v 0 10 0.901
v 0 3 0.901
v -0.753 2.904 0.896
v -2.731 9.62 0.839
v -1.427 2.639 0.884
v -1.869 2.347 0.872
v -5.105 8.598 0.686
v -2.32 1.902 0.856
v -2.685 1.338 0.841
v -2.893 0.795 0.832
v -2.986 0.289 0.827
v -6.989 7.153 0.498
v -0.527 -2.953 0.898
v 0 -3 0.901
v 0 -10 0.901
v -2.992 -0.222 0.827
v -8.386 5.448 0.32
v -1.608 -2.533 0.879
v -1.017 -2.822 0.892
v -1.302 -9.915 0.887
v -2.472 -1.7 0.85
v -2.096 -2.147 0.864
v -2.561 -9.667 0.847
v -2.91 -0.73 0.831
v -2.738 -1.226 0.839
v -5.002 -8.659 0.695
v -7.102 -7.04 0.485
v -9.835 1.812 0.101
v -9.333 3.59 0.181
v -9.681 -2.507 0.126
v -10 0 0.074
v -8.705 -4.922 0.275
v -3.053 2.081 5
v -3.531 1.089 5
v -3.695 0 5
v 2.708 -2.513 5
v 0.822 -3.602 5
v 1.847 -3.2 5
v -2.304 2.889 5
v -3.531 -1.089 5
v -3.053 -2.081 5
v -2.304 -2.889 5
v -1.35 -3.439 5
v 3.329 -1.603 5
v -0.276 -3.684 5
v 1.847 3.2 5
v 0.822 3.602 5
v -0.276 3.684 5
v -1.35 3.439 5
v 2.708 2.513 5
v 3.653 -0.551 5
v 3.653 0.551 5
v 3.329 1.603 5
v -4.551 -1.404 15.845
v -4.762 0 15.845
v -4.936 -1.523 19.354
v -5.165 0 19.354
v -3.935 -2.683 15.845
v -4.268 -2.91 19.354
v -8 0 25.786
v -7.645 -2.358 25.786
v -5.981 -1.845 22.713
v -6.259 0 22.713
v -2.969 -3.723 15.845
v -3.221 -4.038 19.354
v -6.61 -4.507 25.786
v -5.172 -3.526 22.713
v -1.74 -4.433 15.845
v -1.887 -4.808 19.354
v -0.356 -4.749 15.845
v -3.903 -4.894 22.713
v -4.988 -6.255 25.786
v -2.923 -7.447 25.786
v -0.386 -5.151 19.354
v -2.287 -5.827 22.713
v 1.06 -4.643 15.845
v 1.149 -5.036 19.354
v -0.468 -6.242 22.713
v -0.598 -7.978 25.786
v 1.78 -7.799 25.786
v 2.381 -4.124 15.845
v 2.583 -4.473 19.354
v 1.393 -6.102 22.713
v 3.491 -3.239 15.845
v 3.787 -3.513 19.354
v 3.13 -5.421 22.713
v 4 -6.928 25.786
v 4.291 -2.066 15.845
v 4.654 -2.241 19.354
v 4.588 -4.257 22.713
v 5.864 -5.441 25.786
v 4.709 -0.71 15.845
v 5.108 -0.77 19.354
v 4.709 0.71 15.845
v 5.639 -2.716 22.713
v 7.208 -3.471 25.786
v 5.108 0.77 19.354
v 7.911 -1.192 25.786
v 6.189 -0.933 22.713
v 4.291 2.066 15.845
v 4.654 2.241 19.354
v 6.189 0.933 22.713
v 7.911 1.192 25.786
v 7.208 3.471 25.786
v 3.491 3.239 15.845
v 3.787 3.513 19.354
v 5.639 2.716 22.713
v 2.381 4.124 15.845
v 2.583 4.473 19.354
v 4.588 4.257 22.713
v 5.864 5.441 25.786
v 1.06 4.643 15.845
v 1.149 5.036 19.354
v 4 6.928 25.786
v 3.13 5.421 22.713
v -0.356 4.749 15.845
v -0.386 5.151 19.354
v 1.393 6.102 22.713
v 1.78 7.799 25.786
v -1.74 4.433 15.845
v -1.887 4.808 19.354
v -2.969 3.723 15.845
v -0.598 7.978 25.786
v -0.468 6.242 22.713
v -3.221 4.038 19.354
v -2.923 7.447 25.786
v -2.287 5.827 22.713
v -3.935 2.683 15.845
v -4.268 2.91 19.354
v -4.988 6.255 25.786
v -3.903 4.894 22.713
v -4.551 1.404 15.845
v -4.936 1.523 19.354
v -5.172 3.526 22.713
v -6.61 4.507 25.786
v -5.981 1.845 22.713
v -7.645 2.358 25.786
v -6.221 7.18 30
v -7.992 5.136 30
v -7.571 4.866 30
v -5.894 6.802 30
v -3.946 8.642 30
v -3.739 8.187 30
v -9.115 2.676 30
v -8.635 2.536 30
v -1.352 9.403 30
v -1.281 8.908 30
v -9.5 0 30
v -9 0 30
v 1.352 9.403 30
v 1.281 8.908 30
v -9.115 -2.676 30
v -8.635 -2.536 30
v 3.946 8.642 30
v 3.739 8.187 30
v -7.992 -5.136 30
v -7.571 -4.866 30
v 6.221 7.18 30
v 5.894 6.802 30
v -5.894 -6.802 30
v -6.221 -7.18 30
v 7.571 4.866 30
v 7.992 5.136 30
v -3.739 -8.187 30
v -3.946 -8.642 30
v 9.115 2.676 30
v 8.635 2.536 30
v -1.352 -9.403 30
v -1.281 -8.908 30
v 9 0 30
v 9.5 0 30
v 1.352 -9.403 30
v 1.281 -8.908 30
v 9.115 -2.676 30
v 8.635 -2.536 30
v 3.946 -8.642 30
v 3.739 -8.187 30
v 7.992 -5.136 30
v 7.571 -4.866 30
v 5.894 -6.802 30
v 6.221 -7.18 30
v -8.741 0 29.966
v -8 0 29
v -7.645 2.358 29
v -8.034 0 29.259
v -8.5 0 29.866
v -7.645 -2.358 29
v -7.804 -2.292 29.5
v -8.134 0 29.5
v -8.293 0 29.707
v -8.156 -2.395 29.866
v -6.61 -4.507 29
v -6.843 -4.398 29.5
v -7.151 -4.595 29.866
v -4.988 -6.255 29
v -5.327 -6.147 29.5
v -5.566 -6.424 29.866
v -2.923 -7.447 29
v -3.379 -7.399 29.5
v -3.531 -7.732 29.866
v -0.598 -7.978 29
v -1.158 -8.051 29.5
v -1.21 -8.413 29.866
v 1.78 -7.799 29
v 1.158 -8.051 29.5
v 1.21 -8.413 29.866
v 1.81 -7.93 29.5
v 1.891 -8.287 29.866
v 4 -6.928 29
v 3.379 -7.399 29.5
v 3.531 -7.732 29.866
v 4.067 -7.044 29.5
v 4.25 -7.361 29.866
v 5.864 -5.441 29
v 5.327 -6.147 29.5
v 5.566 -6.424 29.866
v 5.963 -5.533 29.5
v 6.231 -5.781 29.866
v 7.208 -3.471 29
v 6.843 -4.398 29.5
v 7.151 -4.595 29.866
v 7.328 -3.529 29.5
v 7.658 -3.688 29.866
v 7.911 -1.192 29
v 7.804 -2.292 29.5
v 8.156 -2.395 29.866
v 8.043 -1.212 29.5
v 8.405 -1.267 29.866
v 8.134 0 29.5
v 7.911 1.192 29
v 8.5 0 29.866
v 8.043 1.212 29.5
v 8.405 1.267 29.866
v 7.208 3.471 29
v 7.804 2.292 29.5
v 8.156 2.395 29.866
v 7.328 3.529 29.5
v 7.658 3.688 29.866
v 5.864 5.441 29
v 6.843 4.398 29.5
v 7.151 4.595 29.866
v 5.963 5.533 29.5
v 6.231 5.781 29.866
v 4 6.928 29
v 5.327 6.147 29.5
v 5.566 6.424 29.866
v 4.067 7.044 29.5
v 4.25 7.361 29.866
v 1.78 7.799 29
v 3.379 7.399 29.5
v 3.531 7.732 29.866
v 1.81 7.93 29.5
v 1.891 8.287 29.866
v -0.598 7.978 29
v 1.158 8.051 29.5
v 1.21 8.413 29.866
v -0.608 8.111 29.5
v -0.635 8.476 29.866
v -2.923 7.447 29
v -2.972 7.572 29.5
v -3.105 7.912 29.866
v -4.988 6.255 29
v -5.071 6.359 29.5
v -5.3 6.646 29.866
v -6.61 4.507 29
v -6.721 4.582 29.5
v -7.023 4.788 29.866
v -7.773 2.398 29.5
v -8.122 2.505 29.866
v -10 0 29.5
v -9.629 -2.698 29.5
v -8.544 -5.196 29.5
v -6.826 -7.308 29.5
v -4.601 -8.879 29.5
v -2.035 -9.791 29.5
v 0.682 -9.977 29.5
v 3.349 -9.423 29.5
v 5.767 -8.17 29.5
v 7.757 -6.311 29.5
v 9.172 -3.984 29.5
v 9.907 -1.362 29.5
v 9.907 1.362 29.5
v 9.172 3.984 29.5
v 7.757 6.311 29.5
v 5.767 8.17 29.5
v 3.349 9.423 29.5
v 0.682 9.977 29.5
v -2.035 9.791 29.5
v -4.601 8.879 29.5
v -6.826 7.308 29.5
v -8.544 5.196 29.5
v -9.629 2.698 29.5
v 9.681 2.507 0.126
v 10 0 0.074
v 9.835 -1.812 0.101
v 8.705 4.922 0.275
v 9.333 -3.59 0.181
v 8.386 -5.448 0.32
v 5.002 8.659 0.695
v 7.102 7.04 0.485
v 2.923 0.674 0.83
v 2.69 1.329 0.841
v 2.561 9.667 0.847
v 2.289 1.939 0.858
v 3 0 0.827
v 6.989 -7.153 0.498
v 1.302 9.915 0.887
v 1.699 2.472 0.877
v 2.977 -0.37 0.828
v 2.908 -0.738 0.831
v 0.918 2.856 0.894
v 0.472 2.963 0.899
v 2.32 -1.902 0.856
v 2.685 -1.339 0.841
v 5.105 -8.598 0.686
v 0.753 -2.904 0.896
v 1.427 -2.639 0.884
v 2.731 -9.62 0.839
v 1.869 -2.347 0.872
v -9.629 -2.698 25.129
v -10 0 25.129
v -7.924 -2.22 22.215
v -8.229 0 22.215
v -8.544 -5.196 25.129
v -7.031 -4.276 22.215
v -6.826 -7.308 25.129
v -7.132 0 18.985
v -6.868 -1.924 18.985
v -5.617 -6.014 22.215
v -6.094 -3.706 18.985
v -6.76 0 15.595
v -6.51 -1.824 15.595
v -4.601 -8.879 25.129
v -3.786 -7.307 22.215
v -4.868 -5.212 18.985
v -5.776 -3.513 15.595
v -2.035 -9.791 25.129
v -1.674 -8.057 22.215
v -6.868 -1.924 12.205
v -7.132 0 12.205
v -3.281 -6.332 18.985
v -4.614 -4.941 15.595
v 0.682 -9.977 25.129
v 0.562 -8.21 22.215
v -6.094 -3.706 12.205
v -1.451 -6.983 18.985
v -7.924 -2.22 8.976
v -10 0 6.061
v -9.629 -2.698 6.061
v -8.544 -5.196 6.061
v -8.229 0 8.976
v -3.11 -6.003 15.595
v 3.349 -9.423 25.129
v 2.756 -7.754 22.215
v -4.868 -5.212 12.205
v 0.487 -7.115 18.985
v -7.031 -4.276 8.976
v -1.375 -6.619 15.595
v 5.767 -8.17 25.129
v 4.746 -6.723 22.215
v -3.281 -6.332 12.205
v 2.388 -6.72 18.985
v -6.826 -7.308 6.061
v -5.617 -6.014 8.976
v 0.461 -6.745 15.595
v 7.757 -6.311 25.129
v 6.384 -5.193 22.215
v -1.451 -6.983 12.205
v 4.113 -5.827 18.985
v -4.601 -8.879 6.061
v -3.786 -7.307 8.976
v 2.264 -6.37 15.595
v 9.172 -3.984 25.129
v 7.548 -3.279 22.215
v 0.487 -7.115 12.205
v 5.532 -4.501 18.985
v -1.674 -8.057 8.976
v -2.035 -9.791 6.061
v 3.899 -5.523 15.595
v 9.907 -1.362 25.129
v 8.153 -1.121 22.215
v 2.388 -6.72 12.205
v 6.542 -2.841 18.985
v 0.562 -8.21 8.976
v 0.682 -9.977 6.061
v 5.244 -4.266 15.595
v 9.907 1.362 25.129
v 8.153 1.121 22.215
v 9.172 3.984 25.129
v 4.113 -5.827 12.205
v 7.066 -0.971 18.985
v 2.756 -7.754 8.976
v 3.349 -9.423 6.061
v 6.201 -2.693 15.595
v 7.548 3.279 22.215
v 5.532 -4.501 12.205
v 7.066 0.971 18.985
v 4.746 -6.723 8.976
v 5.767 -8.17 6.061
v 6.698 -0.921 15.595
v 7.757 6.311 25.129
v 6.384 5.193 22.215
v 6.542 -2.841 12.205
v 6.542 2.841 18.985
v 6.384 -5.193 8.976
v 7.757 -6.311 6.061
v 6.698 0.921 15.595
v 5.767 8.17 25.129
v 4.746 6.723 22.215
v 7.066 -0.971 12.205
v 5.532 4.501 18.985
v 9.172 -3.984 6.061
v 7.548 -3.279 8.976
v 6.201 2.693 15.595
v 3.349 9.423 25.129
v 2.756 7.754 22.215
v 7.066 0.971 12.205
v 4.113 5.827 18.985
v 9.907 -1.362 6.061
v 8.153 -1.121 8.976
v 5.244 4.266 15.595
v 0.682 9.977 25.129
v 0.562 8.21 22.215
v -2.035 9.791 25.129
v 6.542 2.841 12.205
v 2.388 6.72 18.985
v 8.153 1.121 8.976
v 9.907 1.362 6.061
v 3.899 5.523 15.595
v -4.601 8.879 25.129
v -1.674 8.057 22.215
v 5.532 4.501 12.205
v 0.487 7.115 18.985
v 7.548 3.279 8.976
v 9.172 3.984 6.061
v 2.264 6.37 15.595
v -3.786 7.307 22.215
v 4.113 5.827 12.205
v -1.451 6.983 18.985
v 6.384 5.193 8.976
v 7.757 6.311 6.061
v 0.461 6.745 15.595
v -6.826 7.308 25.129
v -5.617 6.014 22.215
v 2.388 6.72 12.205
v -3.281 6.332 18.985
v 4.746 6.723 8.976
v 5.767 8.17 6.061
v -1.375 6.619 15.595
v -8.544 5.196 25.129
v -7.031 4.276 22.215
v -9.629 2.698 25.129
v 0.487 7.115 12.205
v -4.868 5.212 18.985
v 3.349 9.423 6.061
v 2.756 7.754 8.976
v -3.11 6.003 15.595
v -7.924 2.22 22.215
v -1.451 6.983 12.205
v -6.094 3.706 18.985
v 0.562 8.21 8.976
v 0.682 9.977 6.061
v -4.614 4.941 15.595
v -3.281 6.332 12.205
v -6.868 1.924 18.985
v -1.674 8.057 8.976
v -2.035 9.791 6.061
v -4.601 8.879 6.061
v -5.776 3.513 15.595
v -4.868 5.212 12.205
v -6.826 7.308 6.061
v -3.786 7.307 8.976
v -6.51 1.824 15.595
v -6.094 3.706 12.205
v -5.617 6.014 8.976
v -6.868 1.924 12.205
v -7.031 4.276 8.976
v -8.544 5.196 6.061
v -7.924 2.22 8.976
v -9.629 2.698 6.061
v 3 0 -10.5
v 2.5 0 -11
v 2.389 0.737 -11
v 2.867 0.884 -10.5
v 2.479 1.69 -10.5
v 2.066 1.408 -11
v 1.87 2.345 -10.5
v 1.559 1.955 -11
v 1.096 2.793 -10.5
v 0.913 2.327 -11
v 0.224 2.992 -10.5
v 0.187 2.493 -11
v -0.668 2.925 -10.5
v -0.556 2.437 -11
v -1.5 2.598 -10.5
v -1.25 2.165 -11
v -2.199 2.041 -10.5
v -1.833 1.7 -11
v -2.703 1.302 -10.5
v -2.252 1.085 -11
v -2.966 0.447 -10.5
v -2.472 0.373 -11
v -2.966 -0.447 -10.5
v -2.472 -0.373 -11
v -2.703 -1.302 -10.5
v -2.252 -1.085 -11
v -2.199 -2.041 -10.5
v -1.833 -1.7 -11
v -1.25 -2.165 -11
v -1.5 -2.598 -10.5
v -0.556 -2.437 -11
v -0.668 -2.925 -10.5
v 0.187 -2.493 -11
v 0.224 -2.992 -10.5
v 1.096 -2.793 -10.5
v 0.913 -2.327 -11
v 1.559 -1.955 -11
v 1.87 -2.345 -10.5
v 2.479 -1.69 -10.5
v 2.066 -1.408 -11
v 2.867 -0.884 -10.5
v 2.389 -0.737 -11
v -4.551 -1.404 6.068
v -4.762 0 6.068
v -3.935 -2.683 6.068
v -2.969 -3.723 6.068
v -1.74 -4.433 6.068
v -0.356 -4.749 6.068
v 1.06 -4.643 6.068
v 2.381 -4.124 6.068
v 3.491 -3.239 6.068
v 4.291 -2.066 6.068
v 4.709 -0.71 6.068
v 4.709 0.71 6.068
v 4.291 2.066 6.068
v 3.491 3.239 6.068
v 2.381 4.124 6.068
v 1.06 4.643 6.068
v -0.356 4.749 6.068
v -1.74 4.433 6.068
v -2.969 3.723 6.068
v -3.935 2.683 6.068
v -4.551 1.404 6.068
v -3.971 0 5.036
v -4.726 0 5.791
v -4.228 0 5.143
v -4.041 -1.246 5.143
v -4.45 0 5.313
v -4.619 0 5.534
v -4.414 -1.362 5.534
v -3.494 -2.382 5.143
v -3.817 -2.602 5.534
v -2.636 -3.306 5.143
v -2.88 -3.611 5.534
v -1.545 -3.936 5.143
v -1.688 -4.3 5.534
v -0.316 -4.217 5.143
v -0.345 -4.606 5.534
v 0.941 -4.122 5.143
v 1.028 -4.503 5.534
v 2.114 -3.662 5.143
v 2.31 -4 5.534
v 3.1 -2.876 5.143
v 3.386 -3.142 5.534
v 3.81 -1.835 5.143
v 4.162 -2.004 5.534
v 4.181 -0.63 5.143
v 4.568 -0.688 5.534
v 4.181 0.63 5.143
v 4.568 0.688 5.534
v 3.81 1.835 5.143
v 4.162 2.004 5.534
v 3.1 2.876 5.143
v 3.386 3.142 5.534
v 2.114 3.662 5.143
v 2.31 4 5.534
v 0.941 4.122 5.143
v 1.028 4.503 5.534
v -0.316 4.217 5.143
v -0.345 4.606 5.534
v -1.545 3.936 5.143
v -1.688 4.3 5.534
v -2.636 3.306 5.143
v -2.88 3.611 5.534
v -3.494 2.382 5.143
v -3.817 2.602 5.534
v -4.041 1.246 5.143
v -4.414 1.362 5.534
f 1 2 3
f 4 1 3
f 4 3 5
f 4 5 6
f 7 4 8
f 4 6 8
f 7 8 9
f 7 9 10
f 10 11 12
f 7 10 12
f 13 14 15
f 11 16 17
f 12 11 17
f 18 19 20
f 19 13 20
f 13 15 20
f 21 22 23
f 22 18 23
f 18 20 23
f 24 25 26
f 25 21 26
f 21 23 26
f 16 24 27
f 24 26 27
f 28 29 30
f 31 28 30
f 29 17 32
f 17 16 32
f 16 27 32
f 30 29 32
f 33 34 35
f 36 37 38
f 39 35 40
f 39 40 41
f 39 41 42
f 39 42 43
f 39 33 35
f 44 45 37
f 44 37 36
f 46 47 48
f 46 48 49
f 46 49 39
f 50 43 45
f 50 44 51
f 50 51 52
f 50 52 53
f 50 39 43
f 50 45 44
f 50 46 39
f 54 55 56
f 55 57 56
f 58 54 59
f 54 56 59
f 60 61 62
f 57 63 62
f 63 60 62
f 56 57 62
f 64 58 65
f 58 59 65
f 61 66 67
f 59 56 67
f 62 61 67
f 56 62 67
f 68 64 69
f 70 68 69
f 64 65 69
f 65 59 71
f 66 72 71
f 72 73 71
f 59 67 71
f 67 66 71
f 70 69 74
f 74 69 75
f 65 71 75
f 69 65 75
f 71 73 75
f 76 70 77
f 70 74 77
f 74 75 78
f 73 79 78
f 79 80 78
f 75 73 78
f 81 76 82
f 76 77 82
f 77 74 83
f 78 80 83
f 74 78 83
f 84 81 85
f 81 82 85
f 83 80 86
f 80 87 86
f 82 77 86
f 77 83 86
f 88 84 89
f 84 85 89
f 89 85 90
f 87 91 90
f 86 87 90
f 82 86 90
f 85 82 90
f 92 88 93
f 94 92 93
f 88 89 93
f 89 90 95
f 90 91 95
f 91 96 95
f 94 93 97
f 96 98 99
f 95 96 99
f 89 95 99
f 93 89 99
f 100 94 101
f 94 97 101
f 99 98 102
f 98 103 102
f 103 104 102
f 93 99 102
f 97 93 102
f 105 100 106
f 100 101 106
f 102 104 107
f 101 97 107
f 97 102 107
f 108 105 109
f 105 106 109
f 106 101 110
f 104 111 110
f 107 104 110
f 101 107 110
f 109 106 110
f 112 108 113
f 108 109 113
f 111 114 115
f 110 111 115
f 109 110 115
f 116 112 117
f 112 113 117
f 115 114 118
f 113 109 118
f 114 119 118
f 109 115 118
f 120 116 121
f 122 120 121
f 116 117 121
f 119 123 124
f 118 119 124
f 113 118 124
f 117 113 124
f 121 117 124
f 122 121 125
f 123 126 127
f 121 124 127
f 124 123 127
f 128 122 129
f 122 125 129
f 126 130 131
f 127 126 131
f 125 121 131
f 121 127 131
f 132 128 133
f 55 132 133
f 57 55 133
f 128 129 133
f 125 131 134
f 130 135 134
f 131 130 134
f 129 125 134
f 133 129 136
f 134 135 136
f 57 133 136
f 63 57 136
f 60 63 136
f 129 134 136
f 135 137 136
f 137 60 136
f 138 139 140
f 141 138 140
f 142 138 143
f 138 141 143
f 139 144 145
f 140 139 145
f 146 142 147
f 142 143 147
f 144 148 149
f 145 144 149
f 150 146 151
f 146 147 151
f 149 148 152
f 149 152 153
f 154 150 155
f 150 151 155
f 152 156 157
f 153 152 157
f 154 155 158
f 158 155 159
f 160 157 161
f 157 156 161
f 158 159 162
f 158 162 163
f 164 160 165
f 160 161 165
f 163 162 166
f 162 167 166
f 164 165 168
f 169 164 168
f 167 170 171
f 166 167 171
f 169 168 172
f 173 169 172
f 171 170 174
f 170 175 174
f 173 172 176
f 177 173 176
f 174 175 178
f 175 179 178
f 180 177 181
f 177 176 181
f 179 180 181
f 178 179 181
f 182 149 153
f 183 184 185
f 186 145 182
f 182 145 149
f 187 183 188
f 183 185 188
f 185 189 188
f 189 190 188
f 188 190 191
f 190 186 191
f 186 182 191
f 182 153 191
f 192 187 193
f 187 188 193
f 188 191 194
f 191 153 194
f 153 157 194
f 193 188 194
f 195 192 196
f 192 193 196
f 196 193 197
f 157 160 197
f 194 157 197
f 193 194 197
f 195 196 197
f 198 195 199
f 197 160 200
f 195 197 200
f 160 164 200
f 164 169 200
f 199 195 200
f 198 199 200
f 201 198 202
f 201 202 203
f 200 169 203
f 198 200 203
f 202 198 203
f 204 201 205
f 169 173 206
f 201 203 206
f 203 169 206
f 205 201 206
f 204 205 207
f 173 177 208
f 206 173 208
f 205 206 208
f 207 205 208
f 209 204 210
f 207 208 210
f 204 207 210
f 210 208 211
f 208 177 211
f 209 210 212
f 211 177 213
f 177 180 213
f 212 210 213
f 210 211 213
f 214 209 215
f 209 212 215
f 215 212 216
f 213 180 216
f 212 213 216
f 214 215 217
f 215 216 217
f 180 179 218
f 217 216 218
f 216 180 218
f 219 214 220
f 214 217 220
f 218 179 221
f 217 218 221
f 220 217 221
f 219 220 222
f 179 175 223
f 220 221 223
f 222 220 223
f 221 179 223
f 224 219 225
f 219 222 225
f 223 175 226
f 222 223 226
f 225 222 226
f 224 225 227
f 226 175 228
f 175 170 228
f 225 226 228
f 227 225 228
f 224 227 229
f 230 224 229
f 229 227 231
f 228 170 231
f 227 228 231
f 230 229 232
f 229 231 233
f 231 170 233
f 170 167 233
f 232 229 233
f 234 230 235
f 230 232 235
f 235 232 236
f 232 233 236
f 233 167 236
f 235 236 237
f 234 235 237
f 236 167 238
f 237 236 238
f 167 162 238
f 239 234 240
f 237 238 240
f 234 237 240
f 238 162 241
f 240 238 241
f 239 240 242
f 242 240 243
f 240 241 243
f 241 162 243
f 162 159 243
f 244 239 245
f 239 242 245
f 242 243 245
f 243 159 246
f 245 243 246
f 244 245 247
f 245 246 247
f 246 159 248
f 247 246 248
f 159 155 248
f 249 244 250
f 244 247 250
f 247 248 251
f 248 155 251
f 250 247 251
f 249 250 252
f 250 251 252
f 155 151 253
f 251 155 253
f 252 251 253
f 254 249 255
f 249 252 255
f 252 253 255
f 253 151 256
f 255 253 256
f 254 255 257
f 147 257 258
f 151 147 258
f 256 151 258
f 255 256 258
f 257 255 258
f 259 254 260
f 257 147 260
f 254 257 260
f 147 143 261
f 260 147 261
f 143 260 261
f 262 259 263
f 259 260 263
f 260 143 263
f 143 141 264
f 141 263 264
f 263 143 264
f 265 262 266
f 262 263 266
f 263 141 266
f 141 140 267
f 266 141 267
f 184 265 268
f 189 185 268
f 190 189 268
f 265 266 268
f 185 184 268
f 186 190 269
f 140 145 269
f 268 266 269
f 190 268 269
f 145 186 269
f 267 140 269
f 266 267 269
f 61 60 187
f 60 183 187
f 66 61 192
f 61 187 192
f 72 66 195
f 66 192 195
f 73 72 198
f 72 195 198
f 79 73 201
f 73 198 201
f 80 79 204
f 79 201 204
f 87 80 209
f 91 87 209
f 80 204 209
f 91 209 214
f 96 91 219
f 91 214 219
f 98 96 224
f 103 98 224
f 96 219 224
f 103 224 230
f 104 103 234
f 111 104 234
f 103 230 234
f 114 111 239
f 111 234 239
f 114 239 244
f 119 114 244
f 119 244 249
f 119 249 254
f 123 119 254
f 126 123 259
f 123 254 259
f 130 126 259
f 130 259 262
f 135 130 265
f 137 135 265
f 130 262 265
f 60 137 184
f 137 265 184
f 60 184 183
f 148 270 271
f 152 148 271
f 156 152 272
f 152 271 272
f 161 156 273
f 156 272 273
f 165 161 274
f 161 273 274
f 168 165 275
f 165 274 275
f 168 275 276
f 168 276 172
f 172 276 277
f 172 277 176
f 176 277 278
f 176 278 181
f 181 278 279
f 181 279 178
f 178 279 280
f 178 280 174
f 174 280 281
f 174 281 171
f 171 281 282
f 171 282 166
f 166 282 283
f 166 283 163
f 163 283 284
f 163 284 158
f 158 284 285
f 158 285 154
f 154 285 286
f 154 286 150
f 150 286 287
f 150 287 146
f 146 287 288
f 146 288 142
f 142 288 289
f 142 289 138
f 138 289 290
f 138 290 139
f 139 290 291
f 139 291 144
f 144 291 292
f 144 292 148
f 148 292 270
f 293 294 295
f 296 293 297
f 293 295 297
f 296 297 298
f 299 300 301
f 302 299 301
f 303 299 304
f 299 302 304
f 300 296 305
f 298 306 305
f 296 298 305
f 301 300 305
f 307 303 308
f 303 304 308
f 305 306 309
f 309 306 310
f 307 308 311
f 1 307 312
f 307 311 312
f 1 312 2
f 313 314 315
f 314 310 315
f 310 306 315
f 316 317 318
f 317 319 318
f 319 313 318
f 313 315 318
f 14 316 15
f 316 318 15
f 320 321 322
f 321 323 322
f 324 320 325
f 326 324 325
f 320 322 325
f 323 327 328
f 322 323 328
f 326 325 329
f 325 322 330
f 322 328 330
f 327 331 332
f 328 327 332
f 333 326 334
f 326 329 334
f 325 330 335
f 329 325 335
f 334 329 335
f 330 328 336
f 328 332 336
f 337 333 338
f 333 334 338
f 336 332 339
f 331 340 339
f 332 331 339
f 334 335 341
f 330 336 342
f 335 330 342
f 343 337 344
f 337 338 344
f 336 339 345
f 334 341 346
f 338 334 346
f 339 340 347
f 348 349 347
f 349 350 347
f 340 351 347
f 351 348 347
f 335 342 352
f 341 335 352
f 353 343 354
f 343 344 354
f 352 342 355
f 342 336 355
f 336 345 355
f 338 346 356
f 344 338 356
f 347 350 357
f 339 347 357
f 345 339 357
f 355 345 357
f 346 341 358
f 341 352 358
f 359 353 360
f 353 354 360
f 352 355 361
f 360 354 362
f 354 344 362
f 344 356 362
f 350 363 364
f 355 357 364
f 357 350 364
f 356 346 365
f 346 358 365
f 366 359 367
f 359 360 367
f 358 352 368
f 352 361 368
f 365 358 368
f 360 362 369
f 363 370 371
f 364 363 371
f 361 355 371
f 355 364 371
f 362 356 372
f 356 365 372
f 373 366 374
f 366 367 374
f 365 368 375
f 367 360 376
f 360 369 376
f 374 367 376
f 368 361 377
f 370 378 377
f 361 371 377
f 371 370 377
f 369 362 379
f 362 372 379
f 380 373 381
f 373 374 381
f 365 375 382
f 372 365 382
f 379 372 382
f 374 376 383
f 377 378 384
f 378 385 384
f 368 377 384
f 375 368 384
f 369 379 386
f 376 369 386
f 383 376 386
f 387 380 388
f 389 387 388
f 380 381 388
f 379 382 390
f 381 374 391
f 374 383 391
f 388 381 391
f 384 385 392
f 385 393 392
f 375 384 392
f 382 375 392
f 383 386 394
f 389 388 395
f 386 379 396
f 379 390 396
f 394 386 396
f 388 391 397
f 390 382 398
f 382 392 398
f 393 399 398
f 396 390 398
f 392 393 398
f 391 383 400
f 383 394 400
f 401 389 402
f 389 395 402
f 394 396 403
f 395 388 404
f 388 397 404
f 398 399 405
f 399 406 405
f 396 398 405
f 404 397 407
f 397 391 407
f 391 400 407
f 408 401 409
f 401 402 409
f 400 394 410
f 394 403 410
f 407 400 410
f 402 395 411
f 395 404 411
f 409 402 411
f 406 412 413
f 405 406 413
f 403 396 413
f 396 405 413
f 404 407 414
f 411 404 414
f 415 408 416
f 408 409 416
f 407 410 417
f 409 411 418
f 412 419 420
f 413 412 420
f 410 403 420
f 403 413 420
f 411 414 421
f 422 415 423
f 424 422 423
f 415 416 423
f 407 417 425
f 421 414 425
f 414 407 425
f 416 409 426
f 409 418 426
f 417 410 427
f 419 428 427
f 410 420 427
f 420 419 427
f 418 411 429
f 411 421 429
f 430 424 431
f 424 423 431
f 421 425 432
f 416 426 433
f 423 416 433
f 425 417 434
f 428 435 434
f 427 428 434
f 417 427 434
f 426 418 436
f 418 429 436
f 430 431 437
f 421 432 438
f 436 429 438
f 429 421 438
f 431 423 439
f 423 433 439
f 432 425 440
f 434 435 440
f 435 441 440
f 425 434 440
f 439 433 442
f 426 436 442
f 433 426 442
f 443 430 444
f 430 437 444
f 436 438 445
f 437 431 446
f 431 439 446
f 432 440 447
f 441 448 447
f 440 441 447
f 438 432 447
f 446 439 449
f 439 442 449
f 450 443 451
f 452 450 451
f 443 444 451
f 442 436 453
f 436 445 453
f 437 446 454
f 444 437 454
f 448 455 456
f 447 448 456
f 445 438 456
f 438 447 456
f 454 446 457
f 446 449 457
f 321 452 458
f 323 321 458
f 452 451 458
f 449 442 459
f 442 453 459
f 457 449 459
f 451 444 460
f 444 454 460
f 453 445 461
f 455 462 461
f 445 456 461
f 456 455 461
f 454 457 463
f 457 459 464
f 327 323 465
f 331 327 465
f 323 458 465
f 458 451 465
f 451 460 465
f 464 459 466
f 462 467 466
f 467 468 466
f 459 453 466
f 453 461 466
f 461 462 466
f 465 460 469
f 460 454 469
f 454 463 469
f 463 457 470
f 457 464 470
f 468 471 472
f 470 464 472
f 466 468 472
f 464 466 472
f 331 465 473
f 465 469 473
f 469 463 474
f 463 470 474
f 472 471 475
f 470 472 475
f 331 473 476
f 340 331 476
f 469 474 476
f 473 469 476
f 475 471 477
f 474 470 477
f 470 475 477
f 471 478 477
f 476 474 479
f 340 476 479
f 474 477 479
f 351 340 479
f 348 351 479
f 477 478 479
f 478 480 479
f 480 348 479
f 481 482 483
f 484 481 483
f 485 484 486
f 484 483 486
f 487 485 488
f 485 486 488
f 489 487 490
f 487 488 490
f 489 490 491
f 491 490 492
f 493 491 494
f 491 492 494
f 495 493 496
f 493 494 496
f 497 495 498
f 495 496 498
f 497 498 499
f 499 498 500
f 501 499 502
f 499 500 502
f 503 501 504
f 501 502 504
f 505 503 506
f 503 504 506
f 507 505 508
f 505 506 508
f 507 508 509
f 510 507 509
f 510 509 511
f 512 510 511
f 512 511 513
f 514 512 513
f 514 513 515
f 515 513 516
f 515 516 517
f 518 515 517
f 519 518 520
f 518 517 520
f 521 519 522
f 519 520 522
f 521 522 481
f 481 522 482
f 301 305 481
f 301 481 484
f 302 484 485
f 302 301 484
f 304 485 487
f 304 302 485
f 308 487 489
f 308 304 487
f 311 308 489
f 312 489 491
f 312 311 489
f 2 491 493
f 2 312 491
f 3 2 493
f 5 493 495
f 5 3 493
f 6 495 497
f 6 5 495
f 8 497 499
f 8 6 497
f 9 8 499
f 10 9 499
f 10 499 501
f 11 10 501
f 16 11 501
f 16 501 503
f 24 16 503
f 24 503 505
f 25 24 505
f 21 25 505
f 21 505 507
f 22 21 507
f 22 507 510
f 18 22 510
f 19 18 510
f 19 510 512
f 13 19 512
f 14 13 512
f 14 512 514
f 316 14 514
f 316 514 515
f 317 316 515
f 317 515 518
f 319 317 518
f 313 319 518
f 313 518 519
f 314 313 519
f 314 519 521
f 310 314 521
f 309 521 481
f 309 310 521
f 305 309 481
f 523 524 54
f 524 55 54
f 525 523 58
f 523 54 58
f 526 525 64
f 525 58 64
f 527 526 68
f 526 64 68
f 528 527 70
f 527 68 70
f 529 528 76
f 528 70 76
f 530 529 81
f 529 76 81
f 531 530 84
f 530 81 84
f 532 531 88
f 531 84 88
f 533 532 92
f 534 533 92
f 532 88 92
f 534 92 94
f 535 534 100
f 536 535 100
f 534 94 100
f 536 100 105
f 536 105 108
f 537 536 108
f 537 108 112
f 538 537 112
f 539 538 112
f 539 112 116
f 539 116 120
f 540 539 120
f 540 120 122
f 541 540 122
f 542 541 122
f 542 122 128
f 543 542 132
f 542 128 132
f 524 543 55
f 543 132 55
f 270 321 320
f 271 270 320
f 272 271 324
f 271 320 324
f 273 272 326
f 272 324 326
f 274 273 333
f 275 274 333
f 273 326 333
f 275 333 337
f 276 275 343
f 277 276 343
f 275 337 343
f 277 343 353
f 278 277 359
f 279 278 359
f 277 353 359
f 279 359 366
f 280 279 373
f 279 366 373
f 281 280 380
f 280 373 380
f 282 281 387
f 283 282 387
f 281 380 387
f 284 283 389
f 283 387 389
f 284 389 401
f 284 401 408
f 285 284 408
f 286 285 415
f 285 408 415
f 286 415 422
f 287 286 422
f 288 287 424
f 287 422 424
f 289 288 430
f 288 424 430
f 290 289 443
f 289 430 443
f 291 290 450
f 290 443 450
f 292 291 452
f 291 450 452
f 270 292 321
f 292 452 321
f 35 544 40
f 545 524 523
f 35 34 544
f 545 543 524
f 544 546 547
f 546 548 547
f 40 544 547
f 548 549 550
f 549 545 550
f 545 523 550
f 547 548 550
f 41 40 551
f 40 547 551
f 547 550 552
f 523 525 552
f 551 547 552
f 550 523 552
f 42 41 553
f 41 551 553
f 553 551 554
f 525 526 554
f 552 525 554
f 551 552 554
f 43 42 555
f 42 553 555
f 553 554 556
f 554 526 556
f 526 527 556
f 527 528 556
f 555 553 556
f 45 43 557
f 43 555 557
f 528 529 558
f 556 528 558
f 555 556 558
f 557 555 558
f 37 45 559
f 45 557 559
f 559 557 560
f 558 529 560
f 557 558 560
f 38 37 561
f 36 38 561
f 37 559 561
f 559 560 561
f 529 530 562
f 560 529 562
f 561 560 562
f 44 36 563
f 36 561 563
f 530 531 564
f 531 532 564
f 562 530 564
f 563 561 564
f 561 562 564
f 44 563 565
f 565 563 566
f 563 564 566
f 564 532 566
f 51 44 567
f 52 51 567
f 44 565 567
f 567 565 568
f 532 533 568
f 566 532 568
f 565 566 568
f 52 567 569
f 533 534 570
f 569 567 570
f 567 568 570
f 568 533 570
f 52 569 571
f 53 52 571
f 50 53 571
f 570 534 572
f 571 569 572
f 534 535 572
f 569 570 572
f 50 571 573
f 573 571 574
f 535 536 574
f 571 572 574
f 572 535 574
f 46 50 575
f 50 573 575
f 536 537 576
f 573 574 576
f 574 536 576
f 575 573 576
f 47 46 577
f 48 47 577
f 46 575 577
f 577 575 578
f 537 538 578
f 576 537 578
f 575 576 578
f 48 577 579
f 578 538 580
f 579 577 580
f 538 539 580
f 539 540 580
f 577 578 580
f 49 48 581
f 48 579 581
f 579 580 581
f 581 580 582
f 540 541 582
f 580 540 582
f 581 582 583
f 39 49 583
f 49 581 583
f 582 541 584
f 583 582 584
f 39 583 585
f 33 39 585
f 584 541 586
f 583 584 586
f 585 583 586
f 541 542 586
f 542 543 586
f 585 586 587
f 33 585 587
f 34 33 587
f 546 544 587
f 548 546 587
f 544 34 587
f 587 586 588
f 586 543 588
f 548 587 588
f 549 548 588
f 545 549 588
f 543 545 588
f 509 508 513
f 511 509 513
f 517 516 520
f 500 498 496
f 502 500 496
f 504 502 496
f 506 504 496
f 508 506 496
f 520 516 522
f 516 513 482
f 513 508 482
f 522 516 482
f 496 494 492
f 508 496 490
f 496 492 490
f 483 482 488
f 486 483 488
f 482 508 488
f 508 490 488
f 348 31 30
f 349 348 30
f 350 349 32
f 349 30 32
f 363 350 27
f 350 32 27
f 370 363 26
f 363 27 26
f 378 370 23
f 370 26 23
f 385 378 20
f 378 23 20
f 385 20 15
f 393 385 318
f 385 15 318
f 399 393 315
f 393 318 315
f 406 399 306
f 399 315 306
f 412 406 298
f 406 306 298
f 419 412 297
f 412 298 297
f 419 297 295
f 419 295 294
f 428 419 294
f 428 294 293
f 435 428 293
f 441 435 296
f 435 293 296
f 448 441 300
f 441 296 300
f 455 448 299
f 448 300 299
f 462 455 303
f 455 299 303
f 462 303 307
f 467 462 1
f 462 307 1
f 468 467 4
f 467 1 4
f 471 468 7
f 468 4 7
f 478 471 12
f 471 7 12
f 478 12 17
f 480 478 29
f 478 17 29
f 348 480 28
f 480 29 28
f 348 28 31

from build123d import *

# Parameters (mm, degrees)
F2_DEPTH = 12.5
F3_R     = 3
F4_DEPTH = 16
F5_SIZE  = 0.5
F6_SIZE  = 0.5


with BuildPart() as f1:
    # F0 (on Front) → F1 (revolve)
    with BuildSketch(Plane.XZ):
        with BuildLine():
            Line((0, 0), (0, 0.9005403525))
            ThreePointArc((0, 0.9005403525), (-5.0170534649, 0.6935333438), (-10, 0.0739195926))
            Line((-10, 0.0739195926), (-10, 0))
            Line((-10, 0), (0, 0))
        make_face()
        with BuildLine():
            ThreePointArc((-10, 0.0739195926), (-5.0170534649, 0.6935333438), (0, 0.9005403525))
            Line((0, 0.9005403525), (0, 5))
            Line((0, 5), (-3.694741217, 5))
            ThreePointArc((-3.694741217, 5), (-4.4495838523, 5.312666057), (-4.7622499093, 6.0675086923))
            Line((-4.7622499093, 6.0675086923), (-4.7622499093, 15.345285621))
            Line((-4.7622499093, 15.345285621), (-4.7622499093, 15.8448135736))
            ThreePointArc((-4.7622499093, 15.8448135736), (-5.6281002444, 21.0608384026), (-8, 25.7863757656))
            Line((-8, 25.7863757656), (-8, 29))
            ThreePointArc((-8, 29), (-8.2928932188, 29.7071067812), (-9, 30))
            Line((-9, 30), (-10, 30))
            Line((-10, 30), (-10, 25.1294640906))
            ThreePointArc((-10, 25.1294640906), (-6.7604826649, 15.5950495973), (-10, 6.0606351041))
            Line((-10, 6.0606351041), (-10, 0.0739195926))
        make_face()
    revolve(axis=Axis((0, 0, 31.9755728546), (0, 0, 1)))

    # F0 (on Front) → F2 (cut, symmetric)
    with BuildSketch(Plane.XZ):
        with BuildLine():
            Line((0, 0), (0, 0.9005403525))
            ThreePointArc((0, 0.9005403525), (-5.0170534649, 0.6935333438), (-10, 0.0739195926))
            Line((-10, 0.0739195926), (-10, 0))
            Line((-10, 0), (0, 0))
        make_face()
        with BuildLine():
            ThreePointArc((10, 0.0739195926), (5.0170534649, 0.6935333438), (0, 0.9005403525))
            Line((0, 0.9005403525), (0, 0))
            Line((0, 0), (10, 0))
            Line((10, 0), (10, 0.0739195926))
        make_face()
    extrude(amount=F2_DEPTH, both=True, mode=Mode.SUBTRACT)

    # F3 (on face) → F4 (join)
    with BuildSketch(Plane.XY.offset(5)):
        Circle(F3_R)
    extrude(amount=-F4_DEPTH)

    # F5
    f5_edges = [f1.edges().sort_by_distance(p)[0] for p in [
        (10, 0, 30),
    ]]
    chamfer(f5_edges, length=F5_SIZE)

    # F6
    f6_edges = [f1.edges().sort_by_distance(p)[0] for p in [
        (-3, 0, -11),
    ]]
    chamfer(f6_edges, length=F6_SIZE)


solid = f1.part
